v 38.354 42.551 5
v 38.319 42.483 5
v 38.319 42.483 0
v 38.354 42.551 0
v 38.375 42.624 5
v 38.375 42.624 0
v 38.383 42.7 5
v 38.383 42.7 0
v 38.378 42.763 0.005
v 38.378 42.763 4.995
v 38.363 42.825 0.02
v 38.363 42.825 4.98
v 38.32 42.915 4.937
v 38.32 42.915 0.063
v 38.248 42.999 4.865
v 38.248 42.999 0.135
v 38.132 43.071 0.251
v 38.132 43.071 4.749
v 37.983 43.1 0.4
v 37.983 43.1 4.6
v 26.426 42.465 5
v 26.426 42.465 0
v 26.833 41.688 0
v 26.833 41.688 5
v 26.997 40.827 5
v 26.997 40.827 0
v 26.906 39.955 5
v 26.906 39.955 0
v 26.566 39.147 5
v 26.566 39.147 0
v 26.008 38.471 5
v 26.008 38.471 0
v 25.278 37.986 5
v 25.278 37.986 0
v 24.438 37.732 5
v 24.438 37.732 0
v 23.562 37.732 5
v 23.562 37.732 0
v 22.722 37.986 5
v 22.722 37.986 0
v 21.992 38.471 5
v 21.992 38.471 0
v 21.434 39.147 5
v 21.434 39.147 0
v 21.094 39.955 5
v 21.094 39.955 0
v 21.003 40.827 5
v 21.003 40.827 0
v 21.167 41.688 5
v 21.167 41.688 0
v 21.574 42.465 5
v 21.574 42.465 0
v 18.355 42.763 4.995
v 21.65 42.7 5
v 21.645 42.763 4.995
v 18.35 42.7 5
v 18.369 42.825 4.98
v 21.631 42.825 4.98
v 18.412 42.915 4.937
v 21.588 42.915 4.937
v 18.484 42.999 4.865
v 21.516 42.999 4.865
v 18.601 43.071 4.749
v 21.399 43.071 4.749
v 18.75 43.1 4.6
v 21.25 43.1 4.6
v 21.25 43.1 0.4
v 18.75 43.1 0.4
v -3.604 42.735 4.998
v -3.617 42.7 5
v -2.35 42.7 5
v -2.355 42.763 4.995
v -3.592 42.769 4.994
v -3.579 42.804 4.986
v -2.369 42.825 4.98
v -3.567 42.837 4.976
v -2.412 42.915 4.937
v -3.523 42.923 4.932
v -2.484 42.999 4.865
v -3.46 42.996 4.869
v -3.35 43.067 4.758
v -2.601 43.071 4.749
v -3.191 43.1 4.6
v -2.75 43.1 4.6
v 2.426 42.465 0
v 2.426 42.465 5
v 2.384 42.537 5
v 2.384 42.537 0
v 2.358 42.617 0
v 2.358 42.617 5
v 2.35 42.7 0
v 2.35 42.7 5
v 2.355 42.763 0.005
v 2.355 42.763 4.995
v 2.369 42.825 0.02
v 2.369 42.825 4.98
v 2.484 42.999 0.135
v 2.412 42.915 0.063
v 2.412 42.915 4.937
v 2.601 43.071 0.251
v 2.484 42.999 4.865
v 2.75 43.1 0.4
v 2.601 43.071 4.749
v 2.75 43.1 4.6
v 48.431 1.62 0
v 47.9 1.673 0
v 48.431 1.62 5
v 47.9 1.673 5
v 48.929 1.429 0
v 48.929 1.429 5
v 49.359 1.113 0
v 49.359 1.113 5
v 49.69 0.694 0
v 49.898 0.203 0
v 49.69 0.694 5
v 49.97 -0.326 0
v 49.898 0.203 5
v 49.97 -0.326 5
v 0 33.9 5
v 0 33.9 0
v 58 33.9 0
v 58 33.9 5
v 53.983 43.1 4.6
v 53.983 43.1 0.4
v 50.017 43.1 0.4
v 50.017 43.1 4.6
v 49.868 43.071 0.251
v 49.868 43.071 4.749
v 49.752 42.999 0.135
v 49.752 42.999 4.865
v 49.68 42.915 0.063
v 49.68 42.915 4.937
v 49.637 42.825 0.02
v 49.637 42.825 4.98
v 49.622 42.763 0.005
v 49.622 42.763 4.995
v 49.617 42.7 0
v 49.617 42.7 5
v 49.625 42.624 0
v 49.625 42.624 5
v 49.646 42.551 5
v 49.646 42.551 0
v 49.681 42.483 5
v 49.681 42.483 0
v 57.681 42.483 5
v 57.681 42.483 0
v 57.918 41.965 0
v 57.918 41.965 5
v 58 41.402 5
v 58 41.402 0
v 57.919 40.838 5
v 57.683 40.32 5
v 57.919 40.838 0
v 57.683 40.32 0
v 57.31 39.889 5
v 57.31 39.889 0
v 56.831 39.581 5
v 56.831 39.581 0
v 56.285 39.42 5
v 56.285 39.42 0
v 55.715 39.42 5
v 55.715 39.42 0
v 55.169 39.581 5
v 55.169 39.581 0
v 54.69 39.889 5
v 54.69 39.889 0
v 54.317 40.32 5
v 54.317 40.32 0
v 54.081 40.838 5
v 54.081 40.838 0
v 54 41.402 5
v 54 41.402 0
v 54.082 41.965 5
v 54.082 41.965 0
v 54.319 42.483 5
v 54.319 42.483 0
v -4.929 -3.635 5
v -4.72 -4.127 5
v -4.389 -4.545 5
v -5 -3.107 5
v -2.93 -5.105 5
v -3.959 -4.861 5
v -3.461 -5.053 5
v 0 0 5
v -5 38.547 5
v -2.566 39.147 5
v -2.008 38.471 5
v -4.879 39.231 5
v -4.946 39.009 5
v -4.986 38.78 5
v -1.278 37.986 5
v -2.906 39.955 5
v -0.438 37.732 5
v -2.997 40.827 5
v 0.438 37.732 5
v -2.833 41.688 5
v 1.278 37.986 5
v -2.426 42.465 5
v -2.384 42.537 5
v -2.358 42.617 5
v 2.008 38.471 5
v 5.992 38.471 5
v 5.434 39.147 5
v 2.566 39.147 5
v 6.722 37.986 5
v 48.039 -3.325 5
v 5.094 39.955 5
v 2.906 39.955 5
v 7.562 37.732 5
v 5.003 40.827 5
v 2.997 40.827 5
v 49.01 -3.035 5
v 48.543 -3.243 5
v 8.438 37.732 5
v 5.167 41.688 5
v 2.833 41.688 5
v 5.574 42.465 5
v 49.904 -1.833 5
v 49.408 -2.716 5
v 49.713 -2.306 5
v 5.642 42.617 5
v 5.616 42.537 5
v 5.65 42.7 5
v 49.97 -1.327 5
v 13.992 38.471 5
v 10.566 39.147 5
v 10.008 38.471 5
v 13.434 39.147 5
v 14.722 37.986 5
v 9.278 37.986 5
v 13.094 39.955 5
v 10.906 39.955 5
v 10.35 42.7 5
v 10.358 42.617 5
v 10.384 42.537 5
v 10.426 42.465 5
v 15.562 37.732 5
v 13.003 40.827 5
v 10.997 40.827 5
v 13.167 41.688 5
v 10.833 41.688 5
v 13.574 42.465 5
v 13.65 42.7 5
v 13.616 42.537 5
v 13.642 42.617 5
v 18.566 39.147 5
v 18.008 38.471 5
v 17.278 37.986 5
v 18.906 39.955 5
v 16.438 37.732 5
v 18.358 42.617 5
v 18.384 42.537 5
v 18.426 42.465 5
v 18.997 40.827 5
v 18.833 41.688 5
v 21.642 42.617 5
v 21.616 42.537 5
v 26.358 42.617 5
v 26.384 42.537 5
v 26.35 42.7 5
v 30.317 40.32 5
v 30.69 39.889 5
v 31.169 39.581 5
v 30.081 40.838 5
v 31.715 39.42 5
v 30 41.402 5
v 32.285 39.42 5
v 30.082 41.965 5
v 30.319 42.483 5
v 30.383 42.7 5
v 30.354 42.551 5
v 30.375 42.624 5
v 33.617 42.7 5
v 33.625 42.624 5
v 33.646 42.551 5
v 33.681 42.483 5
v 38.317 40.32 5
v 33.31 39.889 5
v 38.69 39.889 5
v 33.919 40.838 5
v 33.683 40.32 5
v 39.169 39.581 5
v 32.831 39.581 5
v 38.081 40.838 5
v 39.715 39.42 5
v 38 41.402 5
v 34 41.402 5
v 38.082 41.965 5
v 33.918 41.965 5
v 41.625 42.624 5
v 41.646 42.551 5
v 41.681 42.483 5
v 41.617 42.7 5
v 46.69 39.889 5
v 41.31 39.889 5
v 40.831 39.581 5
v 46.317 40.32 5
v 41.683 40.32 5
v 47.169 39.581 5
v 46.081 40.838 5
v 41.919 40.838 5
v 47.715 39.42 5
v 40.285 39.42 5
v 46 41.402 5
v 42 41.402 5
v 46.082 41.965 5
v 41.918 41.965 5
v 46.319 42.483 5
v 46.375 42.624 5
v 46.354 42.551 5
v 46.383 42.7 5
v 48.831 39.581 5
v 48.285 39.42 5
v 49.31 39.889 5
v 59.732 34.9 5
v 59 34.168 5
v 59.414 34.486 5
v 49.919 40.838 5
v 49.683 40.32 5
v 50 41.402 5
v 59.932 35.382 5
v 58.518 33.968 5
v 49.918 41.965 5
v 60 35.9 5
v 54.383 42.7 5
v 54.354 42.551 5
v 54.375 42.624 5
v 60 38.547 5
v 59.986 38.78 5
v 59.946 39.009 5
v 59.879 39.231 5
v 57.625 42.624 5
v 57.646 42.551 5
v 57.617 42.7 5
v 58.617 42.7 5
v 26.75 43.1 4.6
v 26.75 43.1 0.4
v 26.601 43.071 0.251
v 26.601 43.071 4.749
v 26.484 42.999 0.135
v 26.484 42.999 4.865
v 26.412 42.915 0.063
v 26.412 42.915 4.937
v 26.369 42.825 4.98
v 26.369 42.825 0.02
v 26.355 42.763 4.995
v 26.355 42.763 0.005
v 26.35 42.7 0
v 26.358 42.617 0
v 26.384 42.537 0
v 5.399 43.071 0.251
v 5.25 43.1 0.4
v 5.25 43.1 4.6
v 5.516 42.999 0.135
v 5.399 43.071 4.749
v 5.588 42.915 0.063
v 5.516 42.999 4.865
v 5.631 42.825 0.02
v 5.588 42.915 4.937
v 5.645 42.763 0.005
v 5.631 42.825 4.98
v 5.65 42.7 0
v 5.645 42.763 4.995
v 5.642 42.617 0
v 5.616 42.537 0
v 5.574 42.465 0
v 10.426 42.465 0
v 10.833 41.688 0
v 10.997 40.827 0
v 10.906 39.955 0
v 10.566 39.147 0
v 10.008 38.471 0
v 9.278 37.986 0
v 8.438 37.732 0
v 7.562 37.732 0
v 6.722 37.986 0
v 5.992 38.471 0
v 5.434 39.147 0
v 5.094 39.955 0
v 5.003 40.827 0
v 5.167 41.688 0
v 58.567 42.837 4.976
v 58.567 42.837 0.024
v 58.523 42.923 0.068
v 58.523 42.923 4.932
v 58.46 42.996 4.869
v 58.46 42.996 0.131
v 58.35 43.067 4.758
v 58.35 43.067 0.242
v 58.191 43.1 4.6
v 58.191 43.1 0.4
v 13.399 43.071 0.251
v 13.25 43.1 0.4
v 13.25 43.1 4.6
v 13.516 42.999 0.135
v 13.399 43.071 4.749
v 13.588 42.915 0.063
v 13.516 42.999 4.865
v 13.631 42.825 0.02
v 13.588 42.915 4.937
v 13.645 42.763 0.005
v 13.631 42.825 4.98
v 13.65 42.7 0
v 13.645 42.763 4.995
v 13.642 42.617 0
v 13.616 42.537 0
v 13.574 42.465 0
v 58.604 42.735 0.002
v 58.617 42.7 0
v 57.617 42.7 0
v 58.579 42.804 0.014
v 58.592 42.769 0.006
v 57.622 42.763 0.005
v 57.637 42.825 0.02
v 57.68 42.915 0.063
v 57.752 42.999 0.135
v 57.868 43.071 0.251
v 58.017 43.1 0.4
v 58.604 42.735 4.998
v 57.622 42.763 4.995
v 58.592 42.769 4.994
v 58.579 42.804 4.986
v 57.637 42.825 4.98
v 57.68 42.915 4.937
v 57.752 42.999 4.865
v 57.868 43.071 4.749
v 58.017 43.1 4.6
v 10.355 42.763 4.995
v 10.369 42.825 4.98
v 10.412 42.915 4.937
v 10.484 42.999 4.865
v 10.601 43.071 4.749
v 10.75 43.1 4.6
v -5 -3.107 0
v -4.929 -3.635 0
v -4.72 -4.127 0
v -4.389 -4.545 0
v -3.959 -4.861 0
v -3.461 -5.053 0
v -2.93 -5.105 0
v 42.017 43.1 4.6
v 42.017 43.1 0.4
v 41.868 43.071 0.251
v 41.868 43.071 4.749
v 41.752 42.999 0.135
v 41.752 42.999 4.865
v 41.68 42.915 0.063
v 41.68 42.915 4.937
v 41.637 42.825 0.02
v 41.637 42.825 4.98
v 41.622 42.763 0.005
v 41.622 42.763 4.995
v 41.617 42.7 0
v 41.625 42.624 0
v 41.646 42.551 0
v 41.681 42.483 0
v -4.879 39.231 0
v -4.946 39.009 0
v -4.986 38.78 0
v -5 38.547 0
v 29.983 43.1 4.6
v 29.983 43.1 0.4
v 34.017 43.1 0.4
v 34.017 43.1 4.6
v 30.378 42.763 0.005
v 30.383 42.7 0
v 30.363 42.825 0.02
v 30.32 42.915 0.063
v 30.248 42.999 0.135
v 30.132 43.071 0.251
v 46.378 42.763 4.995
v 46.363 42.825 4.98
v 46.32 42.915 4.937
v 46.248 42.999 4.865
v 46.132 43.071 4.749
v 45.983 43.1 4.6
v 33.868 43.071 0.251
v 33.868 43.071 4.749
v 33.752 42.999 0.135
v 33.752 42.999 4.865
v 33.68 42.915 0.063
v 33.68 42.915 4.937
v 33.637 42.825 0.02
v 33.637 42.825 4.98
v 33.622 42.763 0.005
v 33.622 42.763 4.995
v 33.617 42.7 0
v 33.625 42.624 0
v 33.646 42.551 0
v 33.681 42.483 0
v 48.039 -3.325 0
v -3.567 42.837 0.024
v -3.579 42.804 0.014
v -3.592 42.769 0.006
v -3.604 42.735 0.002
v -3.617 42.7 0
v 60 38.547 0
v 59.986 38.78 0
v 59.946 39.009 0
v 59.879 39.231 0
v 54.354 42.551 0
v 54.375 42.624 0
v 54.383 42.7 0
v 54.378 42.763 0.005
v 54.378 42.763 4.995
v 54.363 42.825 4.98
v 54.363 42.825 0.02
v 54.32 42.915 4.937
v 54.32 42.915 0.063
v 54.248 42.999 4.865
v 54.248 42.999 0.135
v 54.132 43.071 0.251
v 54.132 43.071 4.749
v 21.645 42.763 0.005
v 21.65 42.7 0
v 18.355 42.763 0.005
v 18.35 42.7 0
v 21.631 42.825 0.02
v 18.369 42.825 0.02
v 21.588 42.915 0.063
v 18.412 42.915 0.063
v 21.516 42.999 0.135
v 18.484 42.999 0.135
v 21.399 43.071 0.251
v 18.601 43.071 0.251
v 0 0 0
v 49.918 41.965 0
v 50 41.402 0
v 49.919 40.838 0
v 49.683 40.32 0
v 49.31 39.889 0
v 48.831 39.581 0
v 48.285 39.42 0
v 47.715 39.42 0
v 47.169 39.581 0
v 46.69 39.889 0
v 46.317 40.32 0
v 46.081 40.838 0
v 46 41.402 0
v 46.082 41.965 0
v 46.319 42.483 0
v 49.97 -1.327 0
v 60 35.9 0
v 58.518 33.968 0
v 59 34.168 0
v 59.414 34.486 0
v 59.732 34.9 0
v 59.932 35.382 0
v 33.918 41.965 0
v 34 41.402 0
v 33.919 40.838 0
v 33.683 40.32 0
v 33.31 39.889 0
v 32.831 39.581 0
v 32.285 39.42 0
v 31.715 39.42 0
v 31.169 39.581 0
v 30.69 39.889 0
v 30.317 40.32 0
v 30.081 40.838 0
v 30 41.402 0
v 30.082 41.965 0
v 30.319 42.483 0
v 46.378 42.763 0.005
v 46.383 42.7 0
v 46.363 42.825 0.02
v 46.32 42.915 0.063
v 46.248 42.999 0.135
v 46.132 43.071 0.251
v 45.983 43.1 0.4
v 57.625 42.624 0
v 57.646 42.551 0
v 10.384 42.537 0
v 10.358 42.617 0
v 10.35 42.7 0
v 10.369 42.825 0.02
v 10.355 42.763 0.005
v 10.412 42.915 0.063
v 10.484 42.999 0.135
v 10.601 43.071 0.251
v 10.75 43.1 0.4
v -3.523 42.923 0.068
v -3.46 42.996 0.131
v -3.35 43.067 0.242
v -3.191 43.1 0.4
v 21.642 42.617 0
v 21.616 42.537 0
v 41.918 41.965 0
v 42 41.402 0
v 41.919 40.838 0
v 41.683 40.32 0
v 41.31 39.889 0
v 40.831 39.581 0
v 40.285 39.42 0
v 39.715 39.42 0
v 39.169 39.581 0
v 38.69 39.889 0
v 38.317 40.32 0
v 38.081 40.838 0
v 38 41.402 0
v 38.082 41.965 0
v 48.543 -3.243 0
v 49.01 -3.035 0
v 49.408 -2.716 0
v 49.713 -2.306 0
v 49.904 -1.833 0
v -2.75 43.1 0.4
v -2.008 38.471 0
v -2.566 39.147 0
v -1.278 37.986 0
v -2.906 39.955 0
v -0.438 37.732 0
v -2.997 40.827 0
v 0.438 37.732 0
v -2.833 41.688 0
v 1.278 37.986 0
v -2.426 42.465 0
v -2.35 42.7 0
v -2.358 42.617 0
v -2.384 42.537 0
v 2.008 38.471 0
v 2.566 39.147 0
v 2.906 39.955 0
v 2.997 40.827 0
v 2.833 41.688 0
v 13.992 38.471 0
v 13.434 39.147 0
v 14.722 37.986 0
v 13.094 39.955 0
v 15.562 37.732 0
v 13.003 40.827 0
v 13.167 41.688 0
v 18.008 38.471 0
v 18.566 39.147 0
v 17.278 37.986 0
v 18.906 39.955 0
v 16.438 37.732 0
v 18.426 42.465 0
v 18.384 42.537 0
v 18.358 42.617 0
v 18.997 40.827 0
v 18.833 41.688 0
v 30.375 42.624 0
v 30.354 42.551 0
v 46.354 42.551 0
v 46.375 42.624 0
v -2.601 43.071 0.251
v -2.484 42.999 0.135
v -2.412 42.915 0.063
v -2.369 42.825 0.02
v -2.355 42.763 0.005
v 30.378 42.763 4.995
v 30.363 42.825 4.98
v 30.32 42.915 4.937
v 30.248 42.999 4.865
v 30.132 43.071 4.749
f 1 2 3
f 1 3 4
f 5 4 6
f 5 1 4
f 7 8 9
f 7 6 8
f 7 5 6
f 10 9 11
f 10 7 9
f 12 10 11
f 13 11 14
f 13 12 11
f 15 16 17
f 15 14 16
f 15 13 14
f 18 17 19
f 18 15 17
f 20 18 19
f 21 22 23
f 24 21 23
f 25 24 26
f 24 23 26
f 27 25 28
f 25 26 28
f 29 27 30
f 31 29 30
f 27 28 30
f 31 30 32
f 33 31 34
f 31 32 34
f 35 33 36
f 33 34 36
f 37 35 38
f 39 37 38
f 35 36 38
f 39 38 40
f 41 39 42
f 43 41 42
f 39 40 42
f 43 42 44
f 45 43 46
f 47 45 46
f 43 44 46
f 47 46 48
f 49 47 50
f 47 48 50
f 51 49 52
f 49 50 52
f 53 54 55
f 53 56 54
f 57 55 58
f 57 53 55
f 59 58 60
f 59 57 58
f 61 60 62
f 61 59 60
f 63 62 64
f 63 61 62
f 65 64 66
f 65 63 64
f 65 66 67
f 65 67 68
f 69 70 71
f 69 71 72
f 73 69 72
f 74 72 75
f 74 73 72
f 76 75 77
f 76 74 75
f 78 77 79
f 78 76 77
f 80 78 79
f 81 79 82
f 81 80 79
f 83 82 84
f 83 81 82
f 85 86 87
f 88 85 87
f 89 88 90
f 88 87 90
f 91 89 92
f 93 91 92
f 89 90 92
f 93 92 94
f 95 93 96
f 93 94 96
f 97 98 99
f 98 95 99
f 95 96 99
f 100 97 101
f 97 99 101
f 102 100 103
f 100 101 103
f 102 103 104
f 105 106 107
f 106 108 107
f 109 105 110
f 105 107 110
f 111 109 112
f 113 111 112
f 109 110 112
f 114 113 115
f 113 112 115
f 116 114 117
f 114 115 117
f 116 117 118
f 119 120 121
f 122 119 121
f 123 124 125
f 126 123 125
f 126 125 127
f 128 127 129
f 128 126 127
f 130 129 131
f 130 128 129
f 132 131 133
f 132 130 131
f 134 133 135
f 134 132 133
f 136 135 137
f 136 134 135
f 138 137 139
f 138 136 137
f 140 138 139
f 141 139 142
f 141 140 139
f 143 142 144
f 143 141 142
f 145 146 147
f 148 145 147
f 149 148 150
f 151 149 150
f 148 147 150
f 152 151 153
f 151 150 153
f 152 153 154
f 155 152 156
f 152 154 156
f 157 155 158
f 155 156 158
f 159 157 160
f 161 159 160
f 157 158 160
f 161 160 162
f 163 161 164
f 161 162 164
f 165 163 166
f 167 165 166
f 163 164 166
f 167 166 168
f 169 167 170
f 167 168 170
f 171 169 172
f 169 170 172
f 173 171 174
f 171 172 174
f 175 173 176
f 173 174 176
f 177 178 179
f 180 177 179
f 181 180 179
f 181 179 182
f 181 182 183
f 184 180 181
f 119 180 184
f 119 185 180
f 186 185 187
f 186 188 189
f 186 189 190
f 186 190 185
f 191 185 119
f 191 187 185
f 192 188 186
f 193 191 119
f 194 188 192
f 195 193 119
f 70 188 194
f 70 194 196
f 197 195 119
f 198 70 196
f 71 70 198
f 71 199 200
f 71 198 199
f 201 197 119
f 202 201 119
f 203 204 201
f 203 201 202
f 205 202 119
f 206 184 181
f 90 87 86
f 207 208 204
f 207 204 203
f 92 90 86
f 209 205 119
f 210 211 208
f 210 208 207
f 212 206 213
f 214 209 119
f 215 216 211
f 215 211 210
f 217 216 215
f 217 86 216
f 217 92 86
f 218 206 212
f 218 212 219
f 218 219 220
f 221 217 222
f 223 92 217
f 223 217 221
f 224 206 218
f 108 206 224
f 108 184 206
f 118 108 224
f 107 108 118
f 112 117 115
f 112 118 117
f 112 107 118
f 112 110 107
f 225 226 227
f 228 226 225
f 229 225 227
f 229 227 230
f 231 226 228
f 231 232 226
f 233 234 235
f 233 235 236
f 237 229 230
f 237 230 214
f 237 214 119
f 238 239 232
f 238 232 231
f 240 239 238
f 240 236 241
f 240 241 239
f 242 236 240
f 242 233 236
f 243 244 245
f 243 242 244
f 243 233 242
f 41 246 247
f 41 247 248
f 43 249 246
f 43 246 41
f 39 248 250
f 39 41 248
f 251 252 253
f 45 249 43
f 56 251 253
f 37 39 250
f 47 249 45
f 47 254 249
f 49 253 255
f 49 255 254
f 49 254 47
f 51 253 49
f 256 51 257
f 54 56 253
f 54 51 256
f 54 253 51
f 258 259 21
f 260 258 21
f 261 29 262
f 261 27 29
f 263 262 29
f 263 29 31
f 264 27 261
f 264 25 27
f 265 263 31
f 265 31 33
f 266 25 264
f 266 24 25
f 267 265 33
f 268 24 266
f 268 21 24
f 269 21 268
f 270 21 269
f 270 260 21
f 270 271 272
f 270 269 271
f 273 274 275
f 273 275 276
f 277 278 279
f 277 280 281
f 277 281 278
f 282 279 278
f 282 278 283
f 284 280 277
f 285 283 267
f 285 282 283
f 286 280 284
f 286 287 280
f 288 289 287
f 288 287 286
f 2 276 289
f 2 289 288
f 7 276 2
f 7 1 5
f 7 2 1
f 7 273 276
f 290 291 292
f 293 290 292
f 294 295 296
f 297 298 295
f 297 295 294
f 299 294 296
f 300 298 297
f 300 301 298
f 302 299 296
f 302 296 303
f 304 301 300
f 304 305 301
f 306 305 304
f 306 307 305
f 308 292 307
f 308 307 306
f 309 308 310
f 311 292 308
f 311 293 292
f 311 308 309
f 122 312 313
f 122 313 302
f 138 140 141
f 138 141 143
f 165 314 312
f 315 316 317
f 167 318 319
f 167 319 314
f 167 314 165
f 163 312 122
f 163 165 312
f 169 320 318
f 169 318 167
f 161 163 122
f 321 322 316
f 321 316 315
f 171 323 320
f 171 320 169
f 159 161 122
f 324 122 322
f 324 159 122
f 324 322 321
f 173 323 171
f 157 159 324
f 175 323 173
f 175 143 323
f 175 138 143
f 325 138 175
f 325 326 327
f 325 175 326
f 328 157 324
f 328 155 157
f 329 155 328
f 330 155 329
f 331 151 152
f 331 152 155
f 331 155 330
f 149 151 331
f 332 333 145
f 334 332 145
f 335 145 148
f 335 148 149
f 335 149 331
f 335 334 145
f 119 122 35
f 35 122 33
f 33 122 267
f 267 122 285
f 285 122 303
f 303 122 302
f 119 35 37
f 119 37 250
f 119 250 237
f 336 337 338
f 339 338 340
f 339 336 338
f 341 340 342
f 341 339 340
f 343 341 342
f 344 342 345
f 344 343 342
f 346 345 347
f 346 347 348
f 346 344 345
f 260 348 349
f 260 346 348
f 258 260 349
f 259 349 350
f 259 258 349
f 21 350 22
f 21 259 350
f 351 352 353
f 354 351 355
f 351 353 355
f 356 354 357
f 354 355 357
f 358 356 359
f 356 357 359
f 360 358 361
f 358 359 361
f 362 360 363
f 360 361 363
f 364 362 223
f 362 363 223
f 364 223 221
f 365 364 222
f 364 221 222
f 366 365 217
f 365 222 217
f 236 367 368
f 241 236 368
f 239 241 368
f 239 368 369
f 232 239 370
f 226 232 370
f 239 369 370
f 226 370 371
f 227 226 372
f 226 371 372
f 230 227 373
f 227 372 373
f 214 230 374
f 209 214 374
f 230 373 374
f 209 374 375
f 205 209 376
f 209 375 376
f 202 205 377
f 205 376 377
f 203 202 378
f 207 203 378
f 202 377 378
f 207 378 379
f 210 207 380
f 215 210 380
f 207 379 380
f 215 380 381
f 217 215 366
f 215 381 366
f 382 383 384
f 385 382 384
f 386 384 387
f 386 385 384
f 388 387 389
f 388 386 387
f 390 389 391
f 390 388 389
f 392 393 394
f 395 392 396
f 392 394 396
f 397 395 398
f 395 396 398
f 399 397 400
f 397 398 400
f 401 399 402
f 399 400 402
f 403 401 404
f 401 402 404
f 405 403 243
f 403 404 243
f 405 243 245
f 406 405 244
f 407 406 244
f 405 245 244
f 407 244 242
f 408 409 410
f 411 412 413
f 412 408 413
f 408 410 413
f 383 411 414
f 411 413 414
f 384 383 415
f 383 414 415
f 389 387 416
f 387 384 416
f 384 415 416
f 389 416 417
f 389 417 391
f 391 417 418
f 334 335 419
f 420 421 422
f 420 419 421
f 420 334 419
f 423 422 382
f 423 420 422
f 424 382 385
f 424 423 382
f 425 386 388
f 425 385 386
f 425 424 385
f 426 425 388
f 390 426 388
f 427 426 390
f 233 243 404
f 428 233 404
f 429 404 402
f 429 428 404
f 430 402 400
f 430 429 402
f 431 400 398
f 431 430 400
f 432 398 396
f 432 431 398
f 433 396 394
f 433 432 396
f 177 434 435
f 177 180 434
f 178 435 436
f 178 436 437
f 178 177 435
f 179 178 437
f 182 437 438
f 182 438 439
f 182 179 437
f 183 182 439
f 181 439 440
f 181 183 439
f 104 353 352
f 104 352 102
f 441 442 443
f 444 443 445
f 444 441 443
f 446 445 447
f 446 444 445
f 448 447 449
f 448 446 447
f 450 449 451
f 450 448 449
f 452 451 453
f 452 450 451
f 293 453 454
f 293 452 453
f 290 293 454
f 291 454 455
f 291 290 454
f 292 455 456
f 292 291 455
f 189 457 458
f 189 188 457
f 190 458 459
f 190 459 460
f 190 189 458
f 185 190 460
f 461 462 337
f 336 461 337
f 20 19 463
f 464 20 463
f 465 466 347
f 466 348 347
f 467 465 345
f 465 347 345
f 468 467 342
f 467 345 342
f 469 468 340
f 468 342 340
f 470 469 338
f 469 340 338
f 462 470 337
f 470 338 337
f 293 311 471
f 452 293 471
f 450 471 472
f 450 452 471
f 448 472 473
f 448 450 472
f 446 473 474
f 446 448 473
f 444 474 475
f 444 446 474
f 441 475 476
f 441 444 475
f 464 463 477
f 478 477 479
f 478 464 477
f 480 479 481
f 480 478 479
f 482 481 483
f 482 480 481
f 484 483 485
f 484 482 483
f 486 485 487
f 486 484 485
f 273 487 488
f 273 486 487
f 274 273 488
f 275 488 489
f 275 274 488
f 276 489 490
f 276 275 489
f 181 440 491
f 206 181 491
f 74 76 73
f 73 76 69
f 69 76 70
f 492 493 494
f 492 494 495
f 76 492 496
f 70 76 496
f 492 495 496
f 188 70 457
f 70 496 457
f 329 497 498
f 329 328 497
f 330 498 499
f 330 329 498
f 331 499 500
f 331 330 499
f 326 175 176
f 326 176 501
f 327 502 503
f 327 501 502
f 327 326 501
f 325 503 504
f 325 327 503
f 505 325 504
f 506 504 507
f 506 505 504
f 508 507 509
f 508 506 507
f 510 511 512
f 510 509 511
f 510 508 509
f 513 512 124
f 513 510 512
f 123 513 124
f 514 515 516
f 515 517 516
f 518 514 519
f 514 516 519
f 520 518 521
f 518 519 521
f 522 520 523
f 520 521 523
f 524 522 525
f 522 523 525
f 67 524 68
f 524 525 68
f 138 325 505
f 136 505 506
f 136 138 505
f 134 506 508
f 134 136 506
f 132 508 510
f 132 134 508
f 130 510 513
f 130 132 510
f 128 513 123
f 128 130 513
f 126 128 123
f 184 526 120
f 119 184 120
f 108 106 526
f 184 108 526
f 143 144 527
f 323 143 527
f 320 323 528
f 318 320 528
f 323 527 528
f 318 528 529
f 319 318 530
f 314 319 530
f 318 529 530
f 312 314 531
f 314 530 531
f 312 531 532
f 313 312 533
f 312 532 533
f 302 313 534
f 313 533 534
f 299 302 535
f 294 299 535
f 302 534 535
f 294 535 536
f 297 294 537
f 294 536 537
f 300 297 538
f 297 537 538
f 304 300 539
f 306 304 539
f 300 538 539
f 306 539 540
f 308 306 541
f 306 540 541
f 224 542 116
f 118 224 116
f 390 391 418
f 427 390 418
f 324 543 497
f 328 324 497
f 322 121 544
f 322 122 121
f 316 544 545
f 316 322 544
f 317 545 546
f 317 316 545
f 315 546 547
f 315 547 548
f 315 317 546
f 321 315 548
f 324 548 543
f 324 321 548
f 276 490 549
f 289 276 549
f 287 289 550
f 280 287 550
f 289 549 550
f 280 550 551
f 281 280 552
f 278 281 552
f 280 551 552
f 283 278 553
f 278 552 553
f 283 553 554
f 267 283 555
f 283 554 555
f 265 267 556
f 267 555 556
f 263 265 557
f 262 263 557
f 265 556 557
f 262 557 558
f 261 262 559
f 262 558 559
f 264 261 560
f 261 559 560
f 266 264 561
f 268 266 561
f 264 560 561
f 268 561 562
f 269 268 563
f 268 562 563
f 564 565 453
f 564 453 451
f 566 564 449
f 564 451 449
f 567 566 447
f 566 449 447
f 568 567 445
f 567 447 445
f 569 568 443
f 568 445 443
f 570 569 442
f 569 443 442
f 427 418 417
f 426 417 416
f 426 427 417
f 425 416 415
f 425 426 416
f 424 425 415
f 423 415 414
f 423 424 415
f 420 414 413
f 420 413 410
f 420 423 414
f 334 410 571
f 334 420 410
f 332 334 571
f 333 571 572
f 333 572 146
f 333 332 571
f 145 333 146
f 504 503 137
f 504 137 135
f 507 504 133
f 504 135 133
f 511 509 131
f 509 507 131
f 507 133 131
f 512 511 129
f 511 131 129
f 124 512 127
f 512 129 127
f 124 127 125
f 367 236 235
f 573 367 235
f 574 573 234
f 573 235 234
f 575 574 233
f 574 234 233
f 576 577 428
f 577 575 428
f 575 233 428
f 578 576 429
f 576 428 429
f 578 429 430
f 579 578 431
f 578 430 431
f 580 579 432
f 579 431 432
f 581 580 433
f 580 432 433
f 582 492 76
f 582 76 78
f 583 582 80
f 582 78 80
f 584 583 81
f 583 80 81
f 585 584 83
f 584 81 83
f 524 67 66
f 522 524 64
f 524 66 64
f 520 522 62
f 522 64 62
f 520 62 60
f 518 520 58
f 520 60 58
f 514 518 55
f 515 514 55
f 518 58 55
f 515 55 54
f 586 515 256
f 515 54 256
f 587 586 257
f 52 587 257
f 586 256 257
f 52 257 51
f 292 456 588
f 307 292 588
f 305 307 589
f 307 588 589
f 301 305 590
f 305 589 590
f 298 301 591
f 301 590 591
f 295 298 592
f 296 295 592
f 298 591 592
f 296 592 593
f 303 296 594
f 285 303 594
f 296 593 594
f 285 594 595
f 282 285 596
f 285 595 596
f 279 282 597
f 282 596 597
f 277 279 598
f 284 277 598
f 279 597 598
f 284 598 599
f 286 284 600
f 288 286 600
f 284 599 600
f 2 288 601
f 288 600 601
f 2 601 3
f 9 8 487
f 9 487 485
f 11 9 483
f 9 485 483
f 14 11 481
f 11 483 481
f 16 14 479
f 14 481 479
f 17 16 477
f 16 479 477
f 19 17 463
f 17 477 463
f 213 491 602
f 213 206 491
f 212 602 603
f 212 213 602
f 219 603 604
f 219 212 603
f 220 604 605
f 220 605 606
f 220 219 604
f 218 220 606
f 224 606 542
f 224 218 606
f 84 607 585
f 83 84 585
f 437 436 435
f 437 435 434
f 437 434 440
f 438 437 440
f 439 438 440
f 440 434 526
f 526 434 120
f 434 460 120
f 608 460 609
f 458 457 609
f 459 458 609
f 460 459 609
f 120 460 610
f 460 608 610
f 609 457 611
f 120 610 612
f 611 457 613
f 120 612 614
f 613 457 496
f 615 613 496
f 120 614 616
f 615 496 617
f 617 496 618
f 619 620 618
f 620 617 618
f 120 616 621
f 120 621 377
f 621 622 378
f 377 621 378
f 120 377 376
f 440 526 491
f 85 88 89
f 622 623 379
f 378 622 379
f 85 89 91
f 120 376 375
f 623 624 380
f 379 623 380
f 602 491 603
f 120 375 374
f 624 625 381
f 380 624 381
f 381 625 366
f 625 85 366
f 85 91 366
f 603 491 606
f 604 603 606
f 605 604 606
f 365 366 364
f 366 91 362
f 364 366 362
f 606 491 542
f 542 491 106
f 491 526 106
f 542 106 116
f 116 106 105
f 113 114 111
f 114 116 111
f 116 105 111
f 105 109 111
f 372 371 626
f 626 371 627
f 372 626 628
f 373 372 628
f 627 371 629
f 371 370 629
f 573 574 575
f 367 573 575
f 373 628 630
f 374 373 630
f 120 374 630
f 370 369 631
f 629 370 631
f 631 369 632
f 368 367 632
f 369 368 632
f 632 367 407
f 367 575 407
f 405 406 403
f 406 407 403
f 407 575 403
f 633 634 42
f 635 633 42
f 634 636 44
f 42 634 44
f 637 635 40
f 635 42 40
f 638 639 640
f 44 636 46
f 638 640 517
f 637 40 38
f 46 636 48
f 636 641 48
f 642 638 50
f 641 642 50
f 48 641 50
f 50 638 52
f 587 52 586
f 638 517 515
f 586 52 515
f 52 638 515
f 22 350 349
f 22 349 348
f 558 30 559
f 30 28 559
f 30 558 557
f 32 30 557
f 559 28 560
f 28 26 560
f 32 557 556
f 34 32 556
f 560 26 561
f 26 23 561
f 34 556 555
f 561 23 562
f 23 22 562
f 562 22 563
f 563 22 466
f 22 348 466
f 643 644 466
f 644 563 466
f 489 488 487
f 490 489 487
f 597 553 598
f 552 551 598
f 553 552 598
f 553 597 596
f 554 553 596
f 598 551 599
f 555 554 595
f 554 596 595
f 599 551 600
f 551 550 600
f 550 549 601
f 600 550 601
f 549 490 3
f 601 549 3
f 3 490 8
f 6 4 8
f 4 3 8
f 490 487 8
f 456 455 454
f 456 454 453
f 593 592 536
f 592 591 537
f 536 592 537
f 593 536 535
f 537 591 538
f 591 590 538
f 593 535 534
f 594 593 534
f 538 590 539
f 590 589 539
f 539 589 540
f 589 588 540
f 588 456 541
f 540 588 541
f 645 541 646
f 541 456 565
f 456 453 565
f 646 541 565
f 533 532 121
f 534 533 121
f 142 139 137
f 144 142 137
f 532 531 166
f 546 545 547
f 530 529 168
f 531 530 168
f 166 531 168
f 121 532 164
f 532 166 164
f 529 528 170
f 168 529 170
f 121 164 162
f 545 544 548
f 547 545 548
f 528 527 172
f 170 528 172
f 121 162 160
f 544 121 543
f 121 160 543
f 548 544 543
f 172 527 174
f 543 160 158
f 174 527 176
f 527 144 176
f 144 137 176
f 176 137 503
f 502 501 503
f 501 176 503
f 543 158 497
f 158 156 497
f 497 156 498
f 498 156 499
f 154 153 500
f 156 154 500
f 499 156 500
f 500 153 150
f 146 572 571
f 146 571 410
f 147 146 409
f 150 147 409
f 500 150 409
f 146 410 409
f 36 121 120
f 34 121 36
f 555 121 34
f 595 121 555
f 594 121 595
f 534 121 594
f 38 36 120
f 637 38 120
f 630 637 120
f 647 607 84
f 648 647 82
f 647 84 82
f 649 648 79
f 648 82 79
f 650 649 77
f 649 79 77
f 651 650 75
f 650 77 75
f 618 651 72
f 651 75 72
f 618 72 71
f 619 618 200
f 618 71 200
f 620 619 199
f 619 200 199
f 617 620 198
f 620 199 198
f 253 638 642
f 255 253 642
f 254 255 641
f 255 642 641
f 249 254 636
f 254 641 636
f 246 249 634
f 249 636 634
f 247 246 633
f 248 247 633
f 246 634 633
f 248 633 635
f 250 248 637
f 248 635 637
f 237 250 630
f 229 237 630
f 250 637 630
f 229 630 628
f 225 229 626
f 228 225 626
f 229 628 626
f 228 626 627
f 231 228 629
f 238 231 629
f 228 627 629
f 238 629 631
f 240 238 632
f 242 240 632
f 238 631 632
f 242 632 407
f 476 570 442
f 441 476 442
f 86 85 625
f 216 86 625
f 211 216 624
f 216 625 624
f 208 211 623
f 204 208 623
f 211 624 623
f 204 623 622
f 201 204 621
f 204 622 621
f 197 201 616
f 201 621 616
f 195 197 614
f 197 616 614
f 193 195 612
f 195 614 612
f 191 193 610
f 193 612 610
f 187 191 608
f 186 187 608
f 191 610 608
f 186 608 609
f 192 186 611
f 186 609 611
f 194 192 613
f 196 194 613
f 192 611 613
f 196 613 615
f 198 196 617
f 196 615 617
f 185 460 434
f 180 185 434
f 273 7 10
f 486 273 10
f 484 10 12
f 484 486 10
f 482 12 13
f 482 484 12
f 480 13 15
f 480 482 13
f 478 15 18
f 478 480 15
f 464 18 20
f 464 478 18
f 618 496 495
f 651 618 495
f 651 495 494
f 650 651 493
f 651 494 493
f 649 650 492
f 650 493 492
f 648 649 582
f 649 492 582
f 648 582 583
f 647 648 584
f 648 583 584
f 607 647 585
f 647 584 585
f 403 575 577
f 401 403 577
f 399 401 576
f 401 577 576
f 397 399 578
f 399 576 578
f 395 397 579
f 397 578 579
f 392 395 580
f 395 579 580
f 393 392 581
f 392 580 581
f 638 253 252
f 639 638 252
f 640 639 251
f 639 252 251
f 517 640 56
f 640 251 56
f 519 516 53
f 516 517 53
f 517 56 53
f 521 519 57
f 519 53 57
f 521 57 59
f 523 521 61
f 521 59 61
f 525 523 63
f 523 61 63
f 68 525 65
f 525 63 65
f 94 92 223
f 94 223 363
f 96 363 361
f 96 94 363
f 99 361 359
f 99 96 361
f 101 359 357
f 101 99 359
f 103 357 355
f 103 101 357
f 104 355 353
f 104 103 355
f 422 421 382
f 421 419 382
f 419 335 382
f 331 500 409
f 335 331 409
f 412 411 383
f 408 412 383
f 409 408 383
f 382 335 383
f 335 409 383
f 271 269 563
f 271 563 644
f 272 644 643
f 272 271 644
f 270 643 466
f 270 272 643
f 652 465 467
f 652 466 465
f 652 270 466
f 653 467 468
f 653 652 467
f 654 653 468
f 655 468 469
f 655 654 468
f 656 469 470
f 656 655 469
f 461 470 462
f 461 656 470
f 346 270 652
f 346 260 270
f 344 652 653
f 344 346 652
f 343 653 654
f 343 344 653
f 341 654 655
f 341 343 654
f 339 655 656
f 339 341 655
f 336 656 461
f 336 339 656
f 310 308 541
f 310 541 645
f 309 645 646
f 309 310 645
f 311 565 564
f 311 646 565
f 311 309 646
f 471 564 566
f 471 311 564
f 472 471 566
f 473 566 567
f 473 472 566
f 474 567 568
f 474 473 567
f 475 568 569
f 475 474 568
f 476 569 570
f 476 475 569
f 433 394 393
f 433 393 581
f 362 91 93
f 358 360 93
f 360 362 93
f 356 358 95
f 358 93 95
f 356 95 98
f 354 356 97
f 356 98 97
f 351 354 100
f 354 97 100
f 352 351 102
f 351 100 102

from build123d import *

# Parameters (mm, degrees)
F1_DEPTH = 5
F2_R     = 2
F3_R     = 0.4


with BuildPart() as f1:
    # F0 (on Top) → F1 (new body)
    with BuildSketch(Plane.XY):
        with BuildLine():
            Line((49.969541, 1.744975), (0, 0))
            Line((0, 0), (0, 33.9))
            Line((0, 33.9), (60, 33.9))
            Line((60, 33.9), (60, 38.9))
            Line((60, 38.9), (58.471325, 43.1))
            Line((58.471325, 43.1), (57.053565, 43.1))
            ThreePointArc((57.053565, 43.1), (56, 39.4), (54.946435, 43.1))
            Line((54.946435, 43.1), (49.053565, 43.1))
            ThreePointArc((49.053565, 43.1), (48, 39.4), (46.946435, 43.1))
            Line((46.946435, 43.1), (41.053565, 43.1))
            ThreePointArc((41.053565, 43.1), (40, 39.4), (38.946435, 43.1))
            Line((38.946435, 43.1), (33.053565, 43.1))
            ThreePointArc((33.053565, 43.1), (32, 39.4), (30.946435, 43.1))
            Line((30.946435, 43.1), (25.8, 43.1))
            ThreePointArc((25.8, 43.1), (24, 37.7), (22.2, 43.1))
            Line((22.2, 43.1), (17.8, 43.1))
            ThreePointArc((17.8, 43.1), (16, 37.7), (14.2, 43.1))
            Line((14.2, 43.1), (9.8, 43.1))
            ThreePointArc((9.8, 43.1), (8, 37.7), (6.2, 43.1))
            Line((6.2, 43.1), (1.8, 43.1))
            ThreePointArc((1.8, 43.1), (0, 37.7), (-1.8, 43.1))
            Line((-1.8, 43.1), (-3.471325, 43.1))
            Line((-3.471325, 43.1), (-5, 38.9))
            Line((-5, 38.9), (-5, -5.177652))
            Line((-5, -5.177652), (49.969541, -3.258073))
            Line((49.969541, -3.258073), (49.969541, 1.744975))
        make_face()
    extrude(amount=F1_DEPTH)

    # F2
    f2_edges = [f1.edges().sort_by_distance(p)[0] for p in [
        (49.969541, 1.744975, 2.5),
        (49.969541, -3.258073, 2.5),
        (-5, -5.177652, 2.5),
        (-5, 38.9, 2.5),
        (60, 33.9, 2.5),
        (60, 38.9, 2.5),
    ]]
    fillet(f2_edges, radius=F2_R)

    # F3
    f3_edges = [f1.edges().sort_by_distance(p)[0] for p in [
        (-1.8, 43.1, 2.5),
        (-3.471325, 43.1, 2.5),
        (-2.635663, 43.1, 0),
        (-2.635663, 43.1, 5),
        (6.2, 43.1, 2.5),
        (1.8, 43.1, 2.5),
        (4, 43.1, 0),
        (4, 43.1, 5),
        (14.2, 43.1, 2.5),
        (9.8, 43.1, 2.5),
        (12, 43.1, 0),
        (12, 43.1, 5),
        (22.2, 43.1, 2.5),
        (17.8, 43.1, 2.5),
        (20, 43.1, 0),
        (20, 43.1, 5),
        (30.946435, 43.1, 2.5),
        (25.8, 43.1, 2.5),
        (28.373217, 43.1, 0),
        (28.373217, 43.1, 5),
        (38.946435, 43.1, 2.5),
        (33.053565, 43.1, 2.5),
        (36, 43.1, 0),
        (36, 43.1, 5),
        (46.946435, 43.1, 2.5),
        (41.053565, 43.1, 2.5),
        (44, 43.1, 0),
        (44, 43.1, 5),
        (54.946435, 43.1, 2.5),
        (49.053565, 43.1, 2.5),
        (52, 43.1, 0),
        (52, 43.1, 5),
        (58.471325, 43.1, 2.5),
        (57.053565, 43.1, 2.5),
        (57.762445, 43.1, 0),
        (57.762445, 43.1, 5),
    ]]
    fillet(f3_edges, radius=F3_R)


solid = f1.part
